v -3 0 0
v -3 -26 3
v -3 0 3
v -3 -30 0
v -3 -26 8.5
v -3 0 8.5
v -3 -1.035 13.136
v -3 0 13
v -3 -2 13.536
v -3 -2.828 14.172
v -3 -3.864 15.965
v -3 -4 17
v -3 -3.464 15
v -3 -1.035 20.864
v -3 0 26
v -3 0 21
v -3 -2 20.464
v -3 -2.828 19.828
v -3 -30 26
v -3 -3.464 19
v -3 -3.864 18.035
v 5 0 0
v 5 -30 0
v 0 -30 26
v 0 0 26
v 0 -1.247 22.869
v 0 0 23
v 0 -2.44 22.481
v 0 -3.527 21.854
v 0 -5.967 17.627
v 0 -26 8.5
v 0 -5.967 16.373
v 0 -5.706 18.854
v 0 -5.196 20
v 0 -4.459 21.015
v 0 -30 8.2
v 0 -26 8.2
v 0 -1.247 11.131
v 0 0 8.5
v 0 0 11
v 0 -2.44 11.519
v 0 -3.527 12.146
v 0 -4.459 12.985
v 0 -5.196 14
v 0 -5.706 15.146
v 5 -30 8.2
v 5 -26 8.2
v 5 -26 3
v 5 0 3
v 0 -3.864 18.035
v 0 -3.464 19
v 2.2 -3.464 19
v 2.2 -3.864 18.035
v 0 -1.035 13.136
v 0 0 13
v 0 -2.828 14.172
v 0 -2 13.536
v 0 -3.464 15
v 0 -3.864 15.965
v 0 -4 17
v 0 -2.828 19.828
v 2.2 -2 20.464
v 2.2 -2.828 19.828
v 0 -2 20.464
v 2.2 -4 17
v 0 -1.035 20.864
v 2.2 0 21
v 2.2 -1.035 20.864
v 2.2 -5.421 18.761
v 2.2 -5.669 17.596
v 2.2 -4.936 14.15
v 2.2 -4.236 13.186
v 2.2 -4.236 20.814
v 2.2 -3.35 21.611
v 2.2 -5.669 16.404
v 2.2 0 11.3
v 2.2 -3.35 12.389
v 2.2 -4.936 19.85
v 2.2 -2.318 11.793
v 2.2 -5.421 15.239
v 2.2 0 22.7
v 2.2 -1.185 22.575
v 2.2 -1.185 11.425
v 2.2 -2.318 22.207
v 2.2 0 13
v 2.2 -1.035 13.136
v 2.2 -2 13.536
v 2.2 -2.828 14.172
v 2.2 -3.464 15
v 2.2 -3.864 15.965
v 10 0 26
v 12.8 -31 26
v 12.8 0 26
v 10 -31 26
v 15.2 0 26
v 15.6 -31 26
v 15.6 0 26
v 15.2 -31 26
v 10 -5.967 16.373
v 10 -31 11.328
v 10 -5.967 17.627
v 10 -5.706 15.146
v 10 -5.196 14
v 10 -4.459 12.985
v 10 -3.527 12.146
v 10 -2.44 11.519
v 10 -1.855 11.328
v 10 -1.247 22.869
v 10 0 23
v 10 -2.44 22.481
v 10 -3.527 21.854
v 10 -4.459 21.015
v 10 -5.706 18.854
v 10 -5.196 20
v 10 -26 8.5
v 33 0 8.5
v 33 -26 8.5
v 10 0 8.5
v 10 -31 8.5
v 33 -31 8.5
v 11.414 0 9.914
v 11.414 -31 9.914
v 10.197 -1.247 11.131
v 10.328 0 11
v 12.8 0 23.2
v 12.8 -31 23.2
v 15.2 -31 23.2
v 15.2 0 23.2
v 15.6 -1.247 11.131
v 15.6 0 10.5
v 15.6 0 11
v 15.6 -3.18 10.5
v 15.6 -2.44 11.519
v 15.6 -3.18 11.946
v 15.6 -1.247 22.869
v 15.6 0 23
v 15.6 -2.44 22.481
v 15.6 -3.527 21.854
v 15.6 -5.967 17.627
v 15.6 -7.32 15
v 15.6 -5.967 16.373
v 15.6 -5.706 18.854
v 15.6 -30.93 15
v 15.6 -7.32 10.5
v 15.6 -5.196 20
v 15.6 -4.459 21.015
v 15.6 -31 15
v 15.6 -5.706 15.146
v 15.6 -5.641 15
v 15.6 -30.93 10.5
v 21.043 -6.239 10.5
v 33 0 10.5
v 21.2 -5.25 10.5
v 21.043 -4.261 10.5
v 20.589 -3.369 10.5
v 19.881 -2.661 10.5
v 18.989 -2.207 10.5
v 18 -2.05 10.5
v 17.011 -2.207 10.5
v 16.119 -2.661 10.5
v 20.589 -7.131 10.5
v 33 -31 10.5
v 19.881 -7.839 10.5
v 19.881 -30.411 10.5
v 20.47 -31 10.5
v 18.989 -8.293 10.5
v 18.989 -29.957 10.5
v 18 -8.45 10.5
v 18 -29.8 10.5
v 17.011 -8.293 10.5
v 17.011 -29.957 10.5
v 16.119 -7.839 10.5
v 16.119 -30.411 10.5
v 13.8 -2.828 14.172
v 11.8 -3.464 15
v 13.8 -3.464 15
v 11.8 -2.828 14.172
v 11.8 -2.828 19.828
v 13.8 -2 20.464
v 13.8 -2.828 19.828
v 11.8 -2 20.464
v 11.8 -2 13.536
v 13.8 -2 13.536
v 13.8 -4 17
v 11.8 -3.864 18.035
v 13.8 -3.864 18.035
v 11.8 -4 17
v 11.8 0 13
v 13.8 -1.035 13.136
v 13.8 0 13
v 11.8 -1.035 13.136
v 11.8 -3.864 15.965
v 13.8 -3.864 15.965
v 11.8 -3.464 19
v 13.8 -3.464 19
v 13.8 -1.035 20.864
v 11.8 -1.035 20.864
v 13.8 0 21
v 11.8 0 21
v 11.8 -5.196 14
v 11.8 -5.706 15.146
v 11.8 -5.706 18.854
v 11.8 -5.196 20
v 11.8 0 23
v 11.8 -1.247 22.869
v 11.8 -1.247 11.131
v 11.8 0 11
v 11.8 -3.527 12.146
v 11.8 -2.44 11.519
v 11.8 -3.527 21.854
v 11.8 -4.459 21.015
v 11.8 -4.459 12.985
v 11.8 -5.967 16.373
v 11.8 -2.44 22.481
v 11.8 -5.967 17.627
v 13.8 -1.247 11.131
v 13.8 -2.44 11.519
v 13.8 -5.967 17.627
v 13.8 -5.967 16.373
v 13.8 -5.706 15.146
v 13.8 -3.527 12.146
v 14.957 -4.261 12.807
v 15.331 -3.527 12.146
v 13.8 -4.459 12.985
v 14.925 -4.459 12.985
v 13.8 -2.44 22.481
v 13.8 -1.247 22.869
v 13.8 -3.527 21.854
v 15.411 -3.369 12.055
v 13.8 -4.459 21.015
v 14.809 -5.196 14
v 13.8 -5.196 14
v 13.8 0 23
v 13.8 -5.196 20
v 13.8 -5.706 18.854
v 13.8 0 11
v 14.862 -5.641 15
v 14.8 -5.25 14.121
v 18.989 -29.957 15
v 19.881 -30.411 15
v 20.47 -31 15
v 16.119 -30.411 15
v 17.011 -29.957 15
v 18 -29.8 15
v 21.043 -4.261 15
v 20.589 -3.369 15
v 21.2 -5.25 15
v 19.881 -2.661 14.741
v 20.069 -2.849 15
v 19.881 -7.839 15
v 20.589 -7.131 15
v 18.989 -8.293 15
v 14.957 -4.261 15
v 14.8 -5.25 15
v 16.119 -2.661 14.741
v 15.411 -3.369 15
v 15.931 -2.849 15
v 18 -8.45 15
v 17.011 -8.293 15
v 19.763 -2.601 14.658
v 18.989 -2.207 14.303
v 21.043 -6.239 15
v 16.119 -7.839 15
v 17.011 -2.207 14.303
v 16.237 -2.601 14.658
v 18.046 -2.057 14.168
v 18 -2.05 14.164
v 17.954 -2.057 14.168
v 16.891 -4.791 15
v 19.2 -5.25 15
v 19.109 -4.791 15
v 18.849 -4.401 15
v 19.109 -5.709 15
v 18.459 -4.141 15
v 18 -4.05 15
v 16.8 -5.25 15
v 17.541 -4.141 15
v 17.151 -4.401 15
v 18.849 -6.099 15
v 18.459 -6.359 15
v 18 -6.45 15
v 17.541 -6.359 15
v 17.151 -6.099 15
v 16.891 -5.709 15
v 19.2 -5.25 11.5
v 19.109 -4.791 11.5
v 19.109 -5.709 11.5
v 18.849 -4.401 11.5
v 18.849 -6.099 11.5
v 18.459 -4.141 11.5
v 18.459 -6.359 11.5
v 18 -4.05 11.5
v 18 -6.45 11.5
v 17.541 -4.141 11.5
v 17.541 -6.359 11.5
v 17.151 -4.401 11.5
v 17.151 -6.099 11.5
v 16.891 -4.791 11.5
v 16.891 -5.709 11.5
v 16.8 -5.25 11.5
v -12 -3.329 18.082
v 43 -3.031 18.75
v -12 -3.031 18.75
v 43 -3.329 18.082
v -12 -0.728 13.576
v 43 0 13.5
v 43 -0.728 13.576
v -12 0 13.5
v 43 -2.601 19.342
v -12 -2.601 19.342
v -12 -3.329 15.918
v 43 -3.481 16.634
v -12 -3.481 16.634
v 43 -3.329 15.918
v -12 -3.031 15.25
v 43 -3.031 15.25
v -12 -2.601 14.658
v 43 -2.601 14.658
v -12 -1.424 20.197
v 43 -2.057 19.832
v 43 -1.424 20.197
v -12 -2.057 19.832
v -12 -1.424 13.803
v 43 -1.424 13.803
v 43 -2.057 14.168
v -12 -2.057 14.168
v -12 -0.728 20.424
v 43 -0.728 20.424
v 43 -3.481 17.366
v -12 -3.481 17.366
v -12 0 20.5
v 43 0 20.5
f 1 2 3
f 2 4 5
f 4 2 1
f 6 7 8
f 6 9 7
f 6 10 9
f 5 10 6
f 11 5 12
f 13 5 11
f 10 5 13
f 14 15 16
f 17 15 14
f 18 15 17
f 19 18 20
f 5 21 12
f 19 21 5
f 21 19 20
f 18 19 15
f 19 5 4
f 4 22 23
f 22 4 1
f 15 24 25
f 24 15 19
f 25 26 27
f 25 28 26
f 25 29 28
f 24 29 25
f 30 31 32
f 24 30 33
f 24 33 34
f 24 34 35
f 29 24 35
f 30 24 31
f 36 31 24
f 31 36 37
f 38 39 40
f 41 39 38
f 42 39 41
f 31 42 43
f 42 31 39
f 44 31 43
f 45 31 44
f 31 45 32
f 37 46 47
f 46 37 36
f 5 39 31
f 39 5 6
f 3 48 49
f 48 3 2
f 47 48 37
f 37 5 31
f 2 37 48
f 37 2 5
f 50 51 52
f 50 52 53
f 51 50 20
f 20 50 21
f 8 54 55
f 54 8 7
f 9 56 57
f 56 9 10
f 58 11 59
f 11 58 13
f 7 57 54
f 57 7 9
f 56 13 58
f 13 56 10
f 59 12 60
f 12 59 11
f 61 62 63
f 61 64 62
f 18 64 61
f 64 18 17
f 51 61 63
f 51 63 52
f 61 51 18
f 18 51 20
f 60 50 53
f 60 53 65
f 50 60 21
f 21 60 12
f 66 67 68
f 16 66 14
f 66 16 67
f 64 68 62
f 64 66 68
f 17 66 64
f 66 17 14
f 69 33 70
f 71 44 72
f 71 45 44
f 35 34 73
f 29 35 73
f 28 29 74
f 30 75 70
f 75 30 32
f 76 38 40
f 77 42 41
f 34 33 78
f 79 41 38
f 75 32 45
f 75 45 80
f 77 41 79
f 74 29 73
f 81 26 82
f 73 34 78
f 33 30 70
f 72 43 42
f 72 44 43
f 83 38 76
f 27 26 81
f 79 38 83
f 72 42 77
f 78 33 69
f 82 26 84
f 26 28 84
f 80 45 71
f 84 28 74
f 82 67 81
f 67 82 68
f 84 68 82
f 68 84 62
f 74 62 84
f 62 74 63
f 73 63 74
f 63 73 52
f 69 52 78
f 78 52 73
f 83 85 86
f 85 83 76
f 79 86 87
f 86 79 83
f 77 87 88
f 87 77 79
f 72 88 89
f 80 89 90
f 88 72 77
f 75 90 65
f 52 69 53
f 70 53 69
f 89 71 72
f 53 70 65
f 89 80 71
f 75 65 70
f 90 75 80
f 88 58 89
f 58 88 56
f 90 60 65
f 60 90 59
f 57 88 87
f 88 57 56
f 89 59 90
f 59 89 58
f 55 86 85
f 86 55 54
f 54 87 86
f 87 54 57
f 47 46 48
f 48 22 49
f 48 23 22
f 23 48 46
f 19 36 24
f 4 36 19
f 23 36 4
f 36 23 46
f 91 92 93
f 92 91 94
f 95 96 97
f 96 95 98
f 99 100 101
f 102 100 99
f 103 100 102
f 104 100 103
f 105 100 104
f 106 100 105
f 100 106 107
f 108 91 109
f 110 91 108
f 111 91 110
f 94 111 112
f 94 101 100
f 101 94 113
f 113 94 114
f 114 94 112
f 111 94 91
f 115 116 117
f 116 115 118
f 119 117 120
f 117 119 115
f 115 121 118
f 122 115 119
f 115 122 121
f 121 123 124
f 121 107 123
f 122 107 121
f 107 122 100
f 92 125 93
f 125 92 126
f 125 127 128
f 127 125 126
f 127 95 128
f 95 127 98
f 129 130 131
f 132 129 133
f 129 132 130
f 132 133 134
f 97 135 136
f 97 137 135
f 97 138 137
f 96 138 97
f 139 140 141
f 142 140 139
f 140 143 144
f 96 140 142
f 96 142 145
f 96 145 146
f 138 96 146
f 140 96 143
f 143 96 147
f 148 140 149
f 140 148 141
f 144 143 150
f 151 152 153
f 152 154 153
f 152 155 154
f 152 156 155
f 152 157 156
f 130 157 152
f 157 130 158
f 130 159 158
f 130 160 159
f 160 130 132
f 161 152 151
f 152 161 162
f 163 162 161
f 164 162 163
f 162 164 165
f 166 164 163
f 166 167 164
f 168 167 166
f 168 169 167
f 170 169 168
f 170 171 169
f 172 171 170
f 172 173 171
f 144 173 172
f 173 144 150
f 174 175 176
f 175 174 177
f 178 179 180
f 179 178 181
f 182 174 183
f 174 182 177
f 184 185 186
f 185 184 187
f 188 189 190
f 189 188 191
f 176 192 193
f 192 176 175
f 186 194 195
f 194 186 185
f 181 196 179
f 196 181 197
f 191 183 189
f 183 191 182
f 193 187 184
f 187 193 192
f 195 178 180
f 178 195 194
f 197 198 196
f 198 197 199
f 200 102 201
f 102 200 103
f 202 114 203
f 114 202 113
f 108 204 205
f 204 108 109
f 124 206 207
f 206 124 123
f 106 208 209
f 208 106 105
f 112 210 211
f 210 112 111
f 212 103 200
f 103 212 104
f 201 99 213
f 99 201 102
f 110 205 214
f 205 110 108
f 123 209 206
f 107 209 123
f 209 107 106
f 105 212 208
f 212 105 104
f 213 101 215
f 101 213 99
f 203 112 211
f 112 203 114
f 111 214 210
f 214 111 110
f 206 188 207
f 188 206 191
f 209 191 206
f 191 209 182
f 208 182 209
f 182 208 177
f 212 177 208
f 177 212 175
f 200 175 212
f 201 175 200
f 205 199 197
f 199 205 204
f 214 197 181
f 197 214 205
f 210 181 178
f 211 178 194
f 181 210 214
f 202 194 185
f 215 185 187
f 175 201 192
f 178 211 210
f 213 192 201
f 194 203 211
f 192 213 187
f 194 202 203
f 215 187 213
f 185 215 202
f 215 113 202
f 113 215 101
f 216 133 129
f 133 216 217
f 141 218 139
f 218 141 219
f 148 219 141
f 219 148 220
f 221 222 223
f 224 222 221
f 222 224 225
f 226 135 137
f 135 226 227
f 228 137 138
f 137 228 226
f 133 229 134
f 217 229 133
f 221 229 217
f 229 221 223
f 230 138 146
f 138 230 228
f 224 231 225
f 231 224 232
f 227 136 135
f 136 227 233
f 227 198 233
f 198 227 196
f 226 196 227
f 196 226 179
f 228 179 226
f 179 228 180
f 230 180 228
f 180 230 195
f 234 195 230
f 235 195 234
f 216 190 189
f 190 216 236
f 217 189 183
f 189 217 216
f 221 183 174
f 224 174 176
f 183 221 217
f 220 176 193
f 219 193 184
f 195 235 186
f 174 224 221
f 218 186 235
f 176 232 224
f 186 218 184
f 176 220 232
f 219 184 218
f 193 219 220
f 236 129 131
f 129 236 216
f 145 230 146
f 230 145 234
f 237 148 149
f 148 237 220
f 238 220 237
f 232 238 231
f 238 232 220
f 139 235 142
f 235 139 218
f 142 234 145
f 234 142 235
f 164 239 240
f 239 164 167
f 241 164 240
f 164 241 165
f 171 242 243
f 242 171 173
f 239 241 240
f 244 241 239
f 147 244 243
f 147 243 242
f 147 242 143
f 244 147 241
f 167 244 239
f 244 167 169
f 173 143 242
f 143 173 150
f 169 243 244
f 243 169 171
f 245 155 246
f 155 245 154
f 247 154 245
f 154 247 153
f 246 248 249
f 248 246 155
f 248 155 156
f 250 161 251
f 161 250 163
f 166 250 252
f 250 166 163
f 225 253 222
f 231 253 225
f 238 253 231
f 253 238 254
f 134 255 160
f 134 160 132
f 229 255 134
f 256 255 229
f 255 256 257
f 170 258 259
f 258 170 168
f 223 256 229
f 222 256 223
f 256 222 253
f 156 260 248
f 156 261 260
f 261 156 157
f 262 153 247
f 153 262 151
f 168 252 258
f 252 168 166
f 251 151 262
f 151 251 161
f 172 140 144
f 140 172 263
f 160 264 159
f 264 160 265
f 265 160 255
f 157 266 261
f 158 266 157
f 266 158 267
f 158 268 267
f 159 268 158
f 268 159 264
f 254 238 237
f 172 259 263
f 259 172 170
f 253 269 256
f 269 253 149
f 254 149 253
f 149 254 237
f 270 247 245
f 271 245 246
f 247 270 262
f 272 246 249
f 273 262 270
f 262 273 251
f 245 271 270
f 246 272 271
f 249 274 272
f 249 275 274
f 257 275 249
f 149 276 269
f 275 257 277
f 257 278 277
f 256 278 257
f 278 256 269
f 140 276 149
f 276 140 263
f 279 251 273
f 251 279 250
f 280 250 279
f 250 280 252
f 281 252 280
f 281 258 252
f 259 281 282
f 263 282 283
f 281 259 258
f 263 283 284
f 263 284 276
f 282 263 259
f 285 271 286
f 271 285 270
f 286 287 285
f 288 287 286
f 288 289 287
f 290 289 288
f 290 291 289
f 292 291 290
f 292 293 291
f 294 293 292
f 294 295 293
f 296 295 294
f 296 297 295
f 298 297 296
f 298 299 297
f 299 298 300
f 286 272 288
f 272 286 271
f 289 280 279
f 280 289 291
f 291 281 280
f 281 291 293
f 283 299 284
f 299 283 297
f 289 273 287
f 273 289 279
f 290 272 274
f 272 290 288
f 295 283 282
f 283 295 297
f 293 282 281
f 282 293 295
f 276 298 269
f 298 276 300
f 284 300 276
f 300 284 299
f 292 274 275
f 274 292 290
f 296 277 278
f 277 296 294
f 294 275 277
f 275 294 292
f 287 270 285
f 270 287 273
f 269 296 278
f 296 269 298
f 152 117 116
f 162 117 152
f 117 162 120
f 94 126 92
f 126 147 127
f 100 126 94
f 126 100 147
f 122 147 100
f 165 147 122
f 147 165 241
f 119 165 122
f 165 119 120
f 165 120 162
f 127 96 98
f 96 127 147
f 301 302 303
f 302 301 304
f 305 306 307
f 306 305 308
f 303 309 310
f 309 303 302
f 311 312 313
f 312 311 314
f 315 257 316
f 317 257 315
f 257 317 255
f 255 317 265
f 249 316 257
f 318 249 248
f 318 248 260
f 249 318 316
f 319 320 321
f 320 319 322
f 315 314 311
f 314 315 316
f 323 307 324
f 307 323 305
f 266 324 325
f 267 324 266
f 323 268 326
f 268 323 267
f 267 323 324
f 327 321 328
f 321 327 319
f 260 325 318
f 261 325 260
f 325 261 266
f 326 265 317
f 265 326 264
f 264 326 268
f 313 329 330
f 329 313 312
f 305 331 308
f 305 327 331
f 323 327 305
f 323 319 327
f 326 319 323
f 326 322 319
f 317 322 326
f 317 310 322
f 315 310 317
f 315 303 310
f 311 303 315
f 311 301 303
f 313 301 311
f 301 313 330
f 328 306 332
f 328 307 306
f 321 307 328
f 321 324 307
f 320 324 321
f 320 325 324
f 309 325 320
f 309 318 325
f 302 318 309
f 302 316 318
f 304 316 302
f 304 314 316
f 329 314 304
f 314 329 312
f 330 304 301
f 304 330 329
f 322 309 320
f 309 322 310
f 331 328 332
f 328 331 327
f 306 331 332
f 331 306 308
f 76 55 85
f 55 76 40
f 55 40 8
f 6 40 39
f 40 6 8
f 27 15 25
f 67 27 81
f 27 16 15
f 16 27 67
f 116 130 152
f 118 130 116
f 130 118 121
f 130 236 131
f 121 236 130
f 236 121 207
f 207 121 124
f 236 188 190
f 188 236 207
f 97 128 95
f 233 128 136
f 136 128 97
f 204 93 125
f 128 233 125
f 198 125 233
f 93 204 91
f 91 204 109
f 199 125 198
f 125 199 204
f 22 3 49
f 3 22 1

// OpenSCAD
caller_part = "none";
include <collar_halter_v2.scad>;

$fn = 40;

// Exploded and Cut view of the IP67 cable seal interface
difference() {
    union() {
        // 1. TPU Socket section (Grey/Dark TPU)
        color(col_bridge)
            intersection() {
                tpu_socket();
                translate([-10, -30, 0])
                    cube([15, 60, pod_base_h]);
            }

        // 2. ASA Capsule stepped tongue entering the socket
        // Displaced by 10mm in X to show the boss entering the counterbore in semi-exploded view
        color(col_body)
            translate([10, -pod_w/2, 0])
                intersection() {
                    pod_left_base();
                    translate([-2, 10, 0])
                        cube([25, 60, pod_base_h]);
                }

        // 3. Continuous Cable Harness (5-wire silicone jacketed bundle)
        color([0.2, 0.2, 0.22])
            translate([-12, 0, conduit_z])
                rotate([0, 90, 0])
                    cylinder(r=3.5, h=55, $fn=30);
    }

    // Cut in half along Y=0 (keep Y <= 0)
    translate([-30, 0, -5])
        cube([80, 50, pod_base_h + 10]);
}
